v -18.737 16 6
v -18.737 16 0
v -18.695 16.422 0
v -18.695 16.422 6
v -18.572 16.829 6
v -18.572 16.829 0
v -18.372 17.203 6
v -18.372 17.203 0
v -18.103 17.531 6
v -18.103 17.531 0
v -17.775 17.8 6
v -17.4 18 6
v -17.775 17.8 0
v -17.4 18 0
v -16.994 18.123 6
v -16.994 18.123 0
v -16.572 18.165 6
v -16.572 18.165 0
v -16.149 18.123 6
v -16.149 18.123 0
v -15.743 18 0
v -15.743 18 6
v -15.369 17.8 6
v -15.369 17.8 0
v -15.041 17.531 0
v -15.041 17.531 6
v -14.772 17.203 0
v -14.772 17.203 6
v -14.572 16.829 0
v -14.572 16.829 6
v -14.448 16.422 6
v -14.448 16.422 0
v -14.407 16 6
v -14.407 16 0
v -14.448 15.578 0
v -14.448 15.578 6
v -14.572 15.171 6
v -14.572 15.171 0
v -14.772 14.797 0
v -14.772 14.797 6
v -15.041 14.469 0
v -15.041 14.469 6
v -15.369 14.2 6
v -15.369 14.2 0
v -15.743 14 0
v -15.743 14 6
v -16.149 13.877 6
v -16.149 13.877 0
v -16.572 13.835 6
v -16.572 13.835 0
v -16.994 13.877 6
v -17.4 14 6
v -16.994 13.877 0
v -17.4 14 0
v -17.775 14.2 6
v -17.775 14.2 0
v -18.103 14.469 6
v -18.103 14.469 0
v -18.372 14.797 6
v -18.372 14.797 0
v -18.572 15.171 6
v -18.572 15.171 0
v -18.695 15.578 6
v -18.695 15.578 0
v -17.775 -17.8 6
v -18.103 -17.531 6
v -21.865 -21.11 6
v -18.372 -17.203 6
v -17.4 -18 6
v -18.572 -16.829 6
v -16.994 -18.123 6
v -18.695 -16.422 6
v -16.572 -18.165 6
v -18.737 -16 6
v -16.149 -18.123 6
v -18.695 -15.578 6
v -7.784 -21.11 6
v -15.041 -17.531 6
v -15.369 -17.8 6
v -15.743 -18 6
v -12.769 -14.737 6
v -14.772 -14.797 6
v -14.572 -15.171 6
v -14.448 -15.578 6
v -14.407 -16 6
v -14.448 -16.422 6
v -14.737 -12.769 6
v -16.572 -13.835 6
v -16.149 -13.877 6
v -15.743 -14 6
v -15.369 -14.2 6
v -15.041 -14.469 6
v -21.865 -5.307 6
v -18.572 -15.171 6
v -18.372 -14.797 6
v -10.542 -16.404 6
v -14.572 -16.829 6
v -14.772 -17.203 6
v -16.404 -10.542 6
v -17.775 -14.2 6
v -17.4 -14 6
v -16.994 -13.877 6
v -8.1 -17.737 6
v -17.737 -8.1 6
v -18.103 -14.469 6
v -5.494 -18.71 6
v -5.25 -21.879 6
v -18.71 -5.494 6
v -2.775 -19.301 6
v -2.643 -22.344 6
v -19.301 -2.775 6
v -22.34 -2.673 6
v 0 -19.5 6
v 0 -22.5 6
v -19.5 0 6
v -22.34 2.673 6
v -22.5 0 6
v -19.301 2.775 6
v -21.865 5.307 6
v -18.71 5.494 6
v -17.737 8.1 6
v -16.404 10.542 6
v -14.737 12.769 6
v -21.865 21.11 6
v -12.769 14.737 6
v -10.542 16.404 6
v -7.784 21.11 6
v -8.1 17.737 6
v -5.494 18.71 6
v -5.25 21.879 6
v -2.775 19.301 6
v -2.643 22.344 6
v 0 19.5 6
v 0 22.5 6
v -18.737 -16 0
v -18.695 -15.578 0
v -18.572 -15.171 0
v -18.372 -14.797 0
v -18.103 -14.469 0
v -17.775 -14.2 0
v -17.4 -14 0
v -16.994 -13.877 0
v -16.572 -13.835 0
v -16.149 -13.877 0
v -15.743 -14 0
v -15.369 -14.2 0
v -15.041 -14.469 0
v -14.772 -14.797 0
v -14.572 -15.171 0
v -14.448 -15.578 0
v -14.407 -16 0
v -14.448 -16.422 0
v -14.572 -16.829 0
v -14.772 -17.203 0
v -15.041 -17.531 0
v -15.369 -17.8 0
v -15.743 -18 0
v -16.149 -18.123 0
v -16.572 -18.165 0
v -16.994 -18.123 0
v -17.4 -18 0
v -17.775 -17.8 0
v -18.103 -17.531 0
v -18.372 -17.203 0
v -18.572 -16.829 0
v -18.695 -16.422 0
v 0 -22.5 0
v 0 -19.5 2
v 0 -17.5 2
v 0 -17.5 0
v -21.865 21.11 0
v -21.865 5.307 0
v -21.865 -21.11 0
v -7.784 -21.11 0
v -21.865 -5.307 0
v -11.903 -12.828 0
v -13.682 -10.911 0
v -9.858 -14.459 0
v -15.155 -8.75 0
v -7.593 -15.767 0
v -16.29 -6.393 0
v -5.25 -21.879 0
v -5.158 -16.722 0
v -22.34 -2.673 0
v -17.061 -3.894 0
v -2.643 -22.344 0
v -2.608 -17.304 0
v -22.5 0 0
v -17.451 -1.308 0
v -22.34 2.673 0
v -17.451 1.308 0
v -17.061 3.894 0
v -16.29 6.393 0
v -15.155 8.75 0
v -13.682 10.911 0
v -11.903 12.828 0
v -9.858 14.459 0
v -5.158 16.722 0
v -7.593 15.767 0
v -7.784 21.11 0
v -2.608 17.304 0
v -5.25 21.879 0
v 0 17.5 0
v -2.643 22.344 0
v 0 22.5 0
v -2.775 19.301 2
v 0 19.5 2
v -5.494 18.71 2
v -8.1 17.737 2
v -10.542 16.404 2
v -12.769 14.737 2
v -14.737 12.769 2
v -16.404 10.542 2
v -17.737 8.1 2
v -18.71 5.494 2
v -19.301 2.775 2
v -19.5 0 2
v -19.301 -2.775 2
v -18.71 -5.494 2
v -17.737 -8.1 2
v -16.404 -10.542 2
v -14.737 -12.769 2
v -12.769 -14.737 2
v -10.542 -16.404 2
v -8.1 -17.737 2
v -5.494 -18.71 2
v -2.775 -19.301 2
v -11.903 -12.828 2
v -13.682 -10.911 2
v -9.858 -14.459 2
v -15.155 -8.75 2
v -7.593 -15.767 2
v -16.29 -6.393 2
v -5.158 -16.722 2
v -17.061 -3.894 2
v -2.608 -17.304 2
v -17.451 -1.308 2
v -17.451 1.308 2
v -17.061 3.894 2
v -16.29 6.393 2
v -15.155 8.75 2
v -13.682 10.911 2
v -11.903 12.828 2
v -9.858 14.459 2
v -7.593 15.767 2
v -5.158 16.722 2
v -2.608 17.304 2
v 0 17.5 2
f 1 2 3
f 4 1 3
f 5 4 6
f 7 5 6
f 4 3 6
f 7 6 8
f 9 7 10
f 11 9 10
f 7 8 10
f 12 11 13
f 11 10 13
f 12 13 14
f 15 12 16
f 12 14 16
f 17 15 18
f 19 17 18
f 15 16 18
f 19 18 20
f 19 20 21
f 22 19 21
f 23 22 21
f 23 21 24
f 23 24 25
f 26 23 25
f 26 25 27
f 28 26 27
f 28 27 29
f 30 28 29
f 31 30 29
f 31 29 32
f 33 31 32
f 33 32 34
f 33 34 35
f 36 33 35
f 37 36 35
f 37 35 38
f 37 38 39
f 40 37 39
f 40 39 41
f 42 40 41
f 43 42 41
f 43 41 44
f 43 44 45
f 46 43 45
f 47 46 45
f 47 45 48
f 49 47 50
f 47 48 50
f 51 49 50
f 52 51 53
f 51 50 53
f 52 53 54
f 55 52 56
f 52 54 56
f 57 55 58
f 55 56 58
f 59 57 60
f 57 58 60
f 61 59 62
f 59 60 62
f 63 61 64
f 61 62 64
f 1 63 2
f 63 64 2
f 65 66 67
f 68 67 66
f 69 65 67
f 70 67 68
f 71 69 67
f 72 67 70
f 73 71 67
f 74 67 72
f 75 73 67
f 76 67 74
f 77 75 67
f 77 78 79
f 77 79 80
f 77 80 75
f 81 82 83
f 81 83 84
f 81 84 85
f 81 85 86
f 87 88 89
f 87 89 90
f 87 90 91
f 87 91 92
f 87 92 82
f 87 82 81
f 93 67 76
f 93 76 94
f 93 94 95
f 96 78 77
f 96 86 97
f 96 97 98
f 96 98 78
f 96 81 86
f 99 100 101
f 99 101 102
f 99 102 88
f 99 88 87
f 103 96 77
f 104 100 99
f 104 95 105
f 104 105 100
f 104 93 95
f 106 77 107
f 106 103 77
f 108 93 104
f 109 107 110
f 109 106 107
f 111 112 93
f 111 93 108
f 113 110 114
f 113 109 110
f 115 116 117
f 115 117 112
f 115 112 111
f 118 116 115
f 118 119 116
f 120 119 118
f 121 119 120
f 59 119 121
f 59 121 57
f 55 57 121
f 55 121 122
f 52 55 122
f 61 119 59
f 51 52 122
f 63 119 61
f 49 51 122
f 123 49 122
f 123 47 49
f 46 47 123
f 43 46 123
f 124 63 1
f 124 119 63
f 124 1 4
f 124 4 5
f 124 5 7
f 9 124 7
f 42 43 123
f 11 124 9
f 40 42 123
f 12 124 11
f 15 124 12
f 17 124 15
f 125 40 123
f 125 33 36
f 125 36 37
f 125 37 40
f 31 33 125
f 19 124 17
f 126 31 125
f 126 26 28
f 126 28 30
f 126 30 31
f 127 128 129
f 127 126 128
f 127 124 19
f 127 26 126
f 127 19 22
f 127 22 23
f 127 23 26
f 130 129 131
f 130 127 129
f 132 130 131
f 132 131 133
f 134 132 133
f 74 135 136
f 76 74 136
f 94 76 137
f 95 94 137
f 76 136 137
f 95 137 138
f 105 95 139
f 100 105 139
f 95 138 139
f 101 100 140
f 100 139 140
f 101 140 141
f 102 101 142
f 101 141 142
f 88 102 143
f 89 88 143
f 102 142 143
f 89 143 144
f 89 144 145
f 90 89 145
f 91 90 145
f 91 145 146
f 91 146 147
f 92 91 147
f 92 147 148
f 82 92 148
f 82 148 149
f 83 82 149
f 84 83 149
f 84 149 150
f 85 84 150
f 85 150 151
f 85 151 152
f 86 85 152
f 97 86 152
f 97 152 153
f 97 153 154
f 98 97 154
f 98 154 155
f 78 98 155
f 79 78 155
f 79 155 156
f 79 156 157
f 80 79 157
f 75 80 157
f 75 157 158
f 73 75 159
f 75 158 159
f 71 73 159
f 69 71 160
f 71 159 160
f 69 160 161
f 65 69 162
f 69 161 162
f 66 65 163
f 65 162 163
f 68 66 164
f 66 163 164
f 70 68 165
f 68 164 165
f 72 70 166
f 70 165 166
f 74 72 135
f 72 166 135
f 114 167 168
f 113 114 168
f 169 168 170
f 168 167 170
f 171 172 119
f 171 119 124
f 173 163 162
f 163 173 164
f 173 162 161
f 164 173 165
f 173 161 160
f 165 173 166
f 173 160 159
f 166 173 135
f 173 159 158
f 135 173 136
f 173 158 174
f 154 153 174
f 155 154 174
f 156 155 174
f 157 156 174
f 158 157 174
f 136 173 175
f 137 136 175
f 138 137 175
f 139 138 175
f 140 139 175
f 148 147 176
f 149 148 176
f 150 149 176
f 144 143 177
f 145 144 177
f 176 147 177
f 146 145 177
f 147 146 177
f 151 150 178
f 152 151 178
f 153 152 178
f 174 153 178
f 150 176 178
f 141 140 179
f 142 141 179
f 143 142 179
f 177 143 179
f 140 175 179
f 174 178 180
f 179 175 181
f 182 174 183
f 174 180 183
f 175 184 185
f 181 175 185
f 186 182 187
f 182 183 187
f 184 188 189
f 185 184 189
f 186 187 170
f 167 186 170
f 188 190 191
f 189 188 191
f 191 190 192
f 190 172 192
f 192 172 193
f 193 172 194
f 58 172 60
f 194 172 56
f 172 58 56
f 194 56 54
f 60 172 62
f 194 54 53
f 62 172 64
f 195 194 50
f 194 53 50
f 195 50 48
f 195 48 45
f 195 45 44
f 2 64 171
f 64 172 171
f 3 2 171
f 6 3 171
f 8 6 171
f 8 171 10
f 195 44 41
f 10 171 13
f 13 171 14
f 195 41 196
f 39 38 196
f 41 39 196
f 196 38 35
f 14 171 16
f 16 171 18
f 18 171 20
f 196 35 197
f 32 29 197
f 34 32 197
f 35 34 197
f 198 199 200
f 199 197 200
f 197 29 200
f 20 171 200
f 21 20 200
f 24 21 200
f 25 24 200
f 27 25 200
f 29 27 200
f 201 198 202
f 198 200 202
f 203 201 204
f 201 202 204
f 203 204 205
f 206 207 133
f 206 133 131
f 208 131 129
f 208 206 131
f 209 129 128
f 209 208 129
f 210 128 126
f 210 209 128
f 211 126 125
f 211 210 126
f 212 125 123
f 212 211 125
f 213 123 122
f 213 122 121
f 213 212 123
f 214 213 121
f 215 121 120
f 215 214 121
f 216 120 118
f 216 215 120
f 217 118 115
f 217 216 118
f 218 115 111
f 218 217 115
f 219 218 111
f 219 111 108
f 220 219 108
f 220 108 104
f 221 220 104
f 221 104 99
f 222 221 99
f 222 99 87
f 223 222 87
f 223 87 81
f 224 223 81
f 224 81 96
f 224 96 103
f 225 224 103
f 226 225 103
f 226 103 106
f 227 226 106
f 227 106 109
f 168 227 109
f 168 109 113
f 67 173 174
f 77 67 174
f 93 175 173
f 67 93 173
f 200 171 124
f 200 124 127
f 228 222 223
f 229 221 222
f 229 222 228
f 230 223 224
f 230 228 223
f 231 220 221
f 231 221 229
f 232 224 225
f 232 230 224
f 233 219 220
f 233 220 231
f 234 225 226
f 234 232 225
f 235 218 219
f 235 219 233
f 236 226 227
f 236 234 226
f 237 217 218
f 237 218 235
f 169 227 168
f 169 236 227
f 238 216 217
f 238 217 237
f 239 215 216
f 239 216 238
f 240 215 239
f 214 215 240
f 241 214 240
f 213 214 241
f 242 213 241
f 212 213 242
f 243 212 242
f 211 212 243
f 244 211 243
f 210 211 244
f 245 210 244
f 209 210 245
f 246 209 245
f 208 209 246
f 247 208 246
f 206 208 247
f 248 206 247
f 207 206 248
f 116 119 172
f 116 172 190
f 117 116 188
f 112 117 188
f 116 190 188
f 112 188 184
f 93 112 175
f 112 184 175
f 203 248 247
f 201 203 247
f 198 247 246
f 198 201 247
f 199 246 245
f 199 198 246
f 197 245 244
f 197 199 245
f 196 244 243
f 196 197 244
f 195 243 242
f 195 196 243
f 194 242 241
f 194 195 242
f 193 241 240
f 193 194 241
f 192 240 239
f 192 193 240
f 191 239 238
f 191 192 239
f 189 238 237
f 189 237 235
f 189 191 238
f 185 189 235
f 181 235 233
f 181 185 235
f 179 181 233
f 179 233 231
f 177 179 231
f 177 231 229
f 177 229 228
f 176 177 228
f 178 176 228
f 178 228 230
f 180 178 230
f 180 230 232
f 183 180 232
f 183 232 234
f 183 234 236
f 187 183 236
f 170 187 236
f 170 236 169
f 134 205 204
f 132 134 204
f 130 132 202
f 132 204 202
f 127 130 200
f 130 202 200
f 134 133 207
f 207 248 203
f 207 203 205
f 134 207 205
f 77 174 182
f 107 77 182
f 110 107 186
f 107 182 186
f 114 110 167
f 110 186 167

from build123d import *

# Parameters (mm, degrees)
SKETCH1_R           = 22.4995417
SKETCH1_R_2         = 17.4995417
BOSS_EXTRUDE1_DEPTH = 6
CUT_EXTRUDE1_START  = -4
SKETCH2_R           = 19.4995417
SKETCH2_R_2         = 17.4995417
CUT_EXTRUDE1_DEPTH  = 4
BOSS_EXTRUDE2_DEPTH = 6
BOSS_EXTRUDE3_START = 24
BOSS_EXTRUDE3_DEPTH = 24
BOSS_EXTRUDE4_START = 5
SKETCH6_R           = 22.4995417
SKETCH6_R_2         = 8.79453705
BOSS_EXTRUDE4_DEPTH = 5
CUT_EXTRUDE2_DEPTH  = 50
SKETCH8_W           = 26.34206851
SKETCH8_H           = 62.78523096
CUT_EXTRUDE3_DEPTH  = 44.051814752
SKETCH9_R           = 2.165
CUT_EXTRUDE4_DEPTH  = 33.379912807


with BuildPart() as part:
    # Sketch1 → Boss-Extrude1 (new body)
    with BuildSketch(Plane.XY):
        Circle(SKETCH1_R)
        Circle(SKETCH1_R_2, mode=Mode.SUBTRACT)
    extrude(amount=BOSS_EXTRUDE1_DEPTH)

    # Sketch2 → Cut-Extrude1 (cut)
    with BuildSketch(Plane.XY.offset(6).offset(CUT_EXTRUDE1_START)):
        Circle(SKETCH2_R)
        Circle(SKETCH2_R_2, mode=Mode.SUBTRACT)
    extrude(amount=CUT_EXTRUDE1_DEPTH, mode=Mode.SUBTRACT)

    # Sketch3 → Boss-Extrude2 (add, through all)
    with BuildSketch(Plane(origin=(0, 0, 0), x_dir=(-1, 0, 0), z_dir=(0, 0, -1))):
        with BuildLine():
            Line((-7.783576547, 21.11031295), (-21.864631522, 21.11031295))
            Line((-21.864631522, 21.11031295), (-21.864631522, 5.307284156))
            ThreePointArc((-21.864631522, 5.307284156), (-16.798452018, 14.96801211), (-7.783576547, 21.11031295))
        make_face()
        with BuildLine():
            Line((21.864631522, -21.11031295), (7.783576547, -21.11031295))
            ThreePointArc((7.783576547, -21.11031295), (16.798452018, -14.96801211), (21.864631522, -5.307284156))
            Line((21.864631522, -5.307284156), (21.864631522, -21.11031295))
        make_face()
        with BuildLine():
            Line((21.864631522, 21.11031295), (7.783576547, 21.11031295))
            ThreePointArc((7.783576547, 21.11031295), (16.798452018, 14.96801211), (21.864631522, 5.307284156))
            Line((21.864631522, 5.307284156), (21.864631522, 21.11031295))
        make_face()
        with BuildLine():
            Line((-21.864631522, -21.11031295), (-21.864631522, -5.307284156))
            ThreePointArc((-21.864631522, -5.307284156), (-16.798452018, -14.96801211), (-7.783576547, -21.11031295))
            Line((-7.783576547, -21.11031295), (-21.864631522, -21.11031295))
        make_face()
    extrude(amount=-BOSS_EXTRUDE2_DEPTH)

    # Sketch5 → Boss-Extrude3 (add)
    with BuildSketch(Plane(origin=(0, 0, 0), x_dir=(-1, 0, 0), z_dir=(0, 0, -1)).offset(BOSS_EXTRUDE3_START)):
        with BuildLine():
            Line((-14.441527519, 9.883129191), (-18.5677863, 12.706954341))
            ThreePointArc((-18.5677863, 12.706954341), (-22.4995417, 0), (-18.5677863, -12.706954341))
            Line((-18.5677863, -12.706954341), (-14.441527519, -9.883129191))
            ThreePointArc((-14.441527519, -9.883129191), (-17.4995417, 0), (-14.441527519, 9.883129191))
        make_face()
    extrude(amount=-BOSS_EXTRUDE3_DEPTH)

    # Sketch6 → Boss-Extrude4 (add)
    with BuildSketch(Plane(origin=(0, 0, -24), x_dir=(-1, 0, 0), z_dir=(0, 0, -1)).offset(BOSS_EXTRUDE4_START)):
        Circle(SKETCH6_R)
        Circle(SKETCH6_R_2, mode=Mode.SUBTRACT)
    extrude(amount=-BOSS_EXTRUDE4_DEPTH)

    # Sketch7 → Cut-Extrude2 (cut, symmetric)
    with BuildSketch(Plane(origin=(0, 0, 0), x_dir=(-1, 0, 0), z_dir=(0, 0, -1))):
        Polygon((0, 20.425006128), (0, -31.813494394), (-34.413040629, -24.963896379), (-30.369302041, 32.308646058), (-0.660202218, 29.585311907), (0, 25.789149152), align=None)
    extrude(amount=CUT_EXTRUDE2_DEPTH, both=True, mode=Mode.SUBTRACT)


with BuildPart() as cut_extrude2_piece_1:
    # of the separate pieces the step leaves, piece 1, a body of its own (cut_extrude2_pieces)
    add(part.part.solids().sort_by_distance((0, -22.4995417, -24))[0])

    # Sketch8 → Cut-Extrude3 (cut, through all)
    with BuildSketch(Plane(origin=(0, 0, 0), x_dir=(0, 0, -1), z_dir=(1, 0, 0))):
        with Locations((23.482670262, -0.940788161)):
            Rectangle(SKETCH8_W, SKETCH8_H)
    extrude(amount=-CUT_EXTRUDE3_DEPTH, mode=Mode.SUBTRACT)


with BuildPart() as cut_extrude2_piece_2:
    # of the separate pieces the step leaves, piece 2, a body of its own (cut_extrude2_pieces)
    add(part.part.solids().sort_by_distance((0, 17.4995417, 0))[0])

    # Sketch9 → Cut-Extrude4 (cut, through all)
    with BuildSketch(Plane(origin=(0, 0, 0), x_dir=(-1, 0, 0), z_dir=(0, 0, -1))):
        with Locations((16.571715691, 16)):
            Circle(SKETCH9_R)
        with Locations((16.571715691, -16)):
            Circle(SKETCH9_R)
        with Locations((-16.571715691, -16)):
            Circle(SKETCH9_R)
        with Locations((-16.571715691, 16)):
            Circle(SKETCH9_R)
    extrude(amount=-CUT_EXTRUDE4_DEPTH, mode=Mode.SUBTRACT)


solid = cut_extrude2_piece_2.part
